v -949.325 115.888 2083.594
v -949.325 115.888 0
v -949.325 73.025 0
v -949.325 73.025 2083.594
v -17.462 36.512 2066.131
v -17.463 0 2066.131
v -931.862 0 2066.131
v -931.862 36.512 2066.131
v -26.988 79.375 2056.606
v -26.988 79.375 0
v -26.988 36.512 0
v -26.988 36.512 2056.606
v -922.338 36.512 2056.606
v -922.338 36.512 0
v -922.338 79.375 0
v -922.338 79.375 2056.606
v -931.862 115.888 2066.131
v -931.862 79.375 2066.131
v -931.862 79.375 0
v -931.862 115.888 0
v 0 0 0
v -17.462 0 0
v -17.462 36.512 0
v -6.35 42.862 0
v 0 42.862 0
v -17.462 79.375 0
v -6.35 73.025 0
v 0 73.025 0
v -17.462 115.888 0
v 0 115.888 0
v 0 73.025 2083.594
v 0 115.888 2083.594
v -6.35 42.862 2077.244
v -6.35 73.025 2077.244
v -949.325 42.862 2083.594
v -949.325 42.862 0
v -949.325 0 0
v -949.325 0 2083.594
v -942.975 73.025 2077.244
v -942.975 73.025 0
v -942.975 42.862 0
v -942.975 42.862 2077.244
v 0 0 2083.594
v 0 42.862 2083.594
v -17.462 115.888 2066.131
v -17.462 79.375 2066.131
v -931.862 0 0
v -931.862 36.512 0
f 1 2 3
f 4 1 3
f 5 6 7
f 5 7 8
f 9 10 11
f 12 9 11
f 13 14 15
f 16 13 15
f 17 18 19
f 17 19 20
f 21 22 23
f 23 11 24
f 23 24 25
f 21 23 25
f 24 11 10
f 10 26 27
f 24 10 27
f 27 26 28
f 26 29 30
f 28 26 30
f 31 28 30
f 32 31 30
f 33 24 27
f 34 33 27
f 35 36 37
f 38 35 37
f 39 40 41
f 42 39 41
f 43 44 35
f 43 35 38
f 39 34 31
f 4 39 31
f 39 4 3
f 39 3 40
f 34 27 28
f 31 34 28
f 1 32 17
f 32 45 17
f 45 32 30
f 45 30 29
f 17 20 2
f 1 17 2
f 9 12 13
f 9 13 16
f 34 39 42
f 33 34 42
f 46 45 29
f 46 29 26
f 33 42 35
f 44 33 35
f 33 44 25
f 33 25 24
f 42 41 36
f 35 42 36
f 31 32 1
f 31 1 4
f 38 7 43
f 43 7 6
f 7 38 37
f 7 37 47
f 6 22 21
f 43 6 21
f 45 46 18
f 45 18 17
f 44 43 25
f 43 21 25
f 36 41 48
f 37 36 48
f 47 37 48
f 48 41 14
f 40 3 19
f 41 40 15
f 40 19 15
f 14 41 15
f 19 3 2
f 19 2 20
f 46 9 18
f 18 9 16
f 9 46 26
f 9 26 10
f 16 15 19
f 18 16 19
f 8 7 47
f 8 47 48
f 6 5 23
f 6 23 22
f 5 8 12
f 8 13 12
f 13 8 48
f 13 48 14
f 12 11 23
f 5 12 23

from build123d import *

# Parameters (mm, degrees)
F1_DEPTH = 2083.59375
F3_DEPTH = 115.8885
F5_DEPTH = 949.325
F6_W     = 6.35
F6_H     = 30.1625
F7_DEPTH = 2083.59475


with BuildPart() as f1:
    # F0 (on Top) → F1 (new body)
    with BuildSketch(Plane.XY):
        Polygon((0, 73.025), (0, 115.8875), (-17.4625, 115.8875), (-17.4625, 79.375), (-26.9875, 79.375), (-26.9875, 36.5125), (-17.4625, 36.5125), (-17.4625, 0), (0, 0), (0, 42.8625), (-6.35, 42.8625), (-6.35, 73.025), align=None)
        Polygon((-949.325, 115.8875), (-949.325, 73.025), (-942.975, 73.025), (-942.975, 42.8625), (-949.325, 42.8625), (-949.325, 0), (-931.8625, 0), (-931.8625, 36.5125), (-922.3375, 36.5125), (-922.3375, 79.375), (-931.8625, 79.375), (-931.8625, 115.8875), align=None)
    extrude(amount=F1_DEPTH)

    # F2 (on Front) → F3 (cut, through all)
    with BuildSketch(Plane.XZ):
        Polygon((0, 2083.59375), (-949.325, 2083.59375), (-474.6625, 1608.93125), align=None)
    extrude(amount=-F3_DEPTH, mode=Mode.SUBTRACT)

    # F4 (on Right) → F5 (join, through all)
    with BuildSketch(Plane.YZ):
        Polygon((79.375, 2066.13125), (115.8875, 2066.13125), (115.8875, 2083.59375), (73.025, 2083.59375), (73.025, 2077.24375), (42.8625, 2077.24375), (42.8625, 2083.59375), (0, 2083.59375), (0, 2066.13125), (36.5125, 2066.13125), (36.5125, 2056.60625), (79.375, 2056.60625), align=None)
    extrude(amount=-F5_DEPTH)

    # F6 (on Top) → F7 (cut, through all)
    with BuildSketch(Plane.XY):
        with Locations((-3.175, 57.94375)):
            Rectangle(F6_W, F6_H)
        with Locations((-946.15, 57.94375)):
            Rectangle(F6_W, F6_H)
    extrude(amount=F7_DEPTH, mode=Mode.SUBTRACT)


solid = f1.part
